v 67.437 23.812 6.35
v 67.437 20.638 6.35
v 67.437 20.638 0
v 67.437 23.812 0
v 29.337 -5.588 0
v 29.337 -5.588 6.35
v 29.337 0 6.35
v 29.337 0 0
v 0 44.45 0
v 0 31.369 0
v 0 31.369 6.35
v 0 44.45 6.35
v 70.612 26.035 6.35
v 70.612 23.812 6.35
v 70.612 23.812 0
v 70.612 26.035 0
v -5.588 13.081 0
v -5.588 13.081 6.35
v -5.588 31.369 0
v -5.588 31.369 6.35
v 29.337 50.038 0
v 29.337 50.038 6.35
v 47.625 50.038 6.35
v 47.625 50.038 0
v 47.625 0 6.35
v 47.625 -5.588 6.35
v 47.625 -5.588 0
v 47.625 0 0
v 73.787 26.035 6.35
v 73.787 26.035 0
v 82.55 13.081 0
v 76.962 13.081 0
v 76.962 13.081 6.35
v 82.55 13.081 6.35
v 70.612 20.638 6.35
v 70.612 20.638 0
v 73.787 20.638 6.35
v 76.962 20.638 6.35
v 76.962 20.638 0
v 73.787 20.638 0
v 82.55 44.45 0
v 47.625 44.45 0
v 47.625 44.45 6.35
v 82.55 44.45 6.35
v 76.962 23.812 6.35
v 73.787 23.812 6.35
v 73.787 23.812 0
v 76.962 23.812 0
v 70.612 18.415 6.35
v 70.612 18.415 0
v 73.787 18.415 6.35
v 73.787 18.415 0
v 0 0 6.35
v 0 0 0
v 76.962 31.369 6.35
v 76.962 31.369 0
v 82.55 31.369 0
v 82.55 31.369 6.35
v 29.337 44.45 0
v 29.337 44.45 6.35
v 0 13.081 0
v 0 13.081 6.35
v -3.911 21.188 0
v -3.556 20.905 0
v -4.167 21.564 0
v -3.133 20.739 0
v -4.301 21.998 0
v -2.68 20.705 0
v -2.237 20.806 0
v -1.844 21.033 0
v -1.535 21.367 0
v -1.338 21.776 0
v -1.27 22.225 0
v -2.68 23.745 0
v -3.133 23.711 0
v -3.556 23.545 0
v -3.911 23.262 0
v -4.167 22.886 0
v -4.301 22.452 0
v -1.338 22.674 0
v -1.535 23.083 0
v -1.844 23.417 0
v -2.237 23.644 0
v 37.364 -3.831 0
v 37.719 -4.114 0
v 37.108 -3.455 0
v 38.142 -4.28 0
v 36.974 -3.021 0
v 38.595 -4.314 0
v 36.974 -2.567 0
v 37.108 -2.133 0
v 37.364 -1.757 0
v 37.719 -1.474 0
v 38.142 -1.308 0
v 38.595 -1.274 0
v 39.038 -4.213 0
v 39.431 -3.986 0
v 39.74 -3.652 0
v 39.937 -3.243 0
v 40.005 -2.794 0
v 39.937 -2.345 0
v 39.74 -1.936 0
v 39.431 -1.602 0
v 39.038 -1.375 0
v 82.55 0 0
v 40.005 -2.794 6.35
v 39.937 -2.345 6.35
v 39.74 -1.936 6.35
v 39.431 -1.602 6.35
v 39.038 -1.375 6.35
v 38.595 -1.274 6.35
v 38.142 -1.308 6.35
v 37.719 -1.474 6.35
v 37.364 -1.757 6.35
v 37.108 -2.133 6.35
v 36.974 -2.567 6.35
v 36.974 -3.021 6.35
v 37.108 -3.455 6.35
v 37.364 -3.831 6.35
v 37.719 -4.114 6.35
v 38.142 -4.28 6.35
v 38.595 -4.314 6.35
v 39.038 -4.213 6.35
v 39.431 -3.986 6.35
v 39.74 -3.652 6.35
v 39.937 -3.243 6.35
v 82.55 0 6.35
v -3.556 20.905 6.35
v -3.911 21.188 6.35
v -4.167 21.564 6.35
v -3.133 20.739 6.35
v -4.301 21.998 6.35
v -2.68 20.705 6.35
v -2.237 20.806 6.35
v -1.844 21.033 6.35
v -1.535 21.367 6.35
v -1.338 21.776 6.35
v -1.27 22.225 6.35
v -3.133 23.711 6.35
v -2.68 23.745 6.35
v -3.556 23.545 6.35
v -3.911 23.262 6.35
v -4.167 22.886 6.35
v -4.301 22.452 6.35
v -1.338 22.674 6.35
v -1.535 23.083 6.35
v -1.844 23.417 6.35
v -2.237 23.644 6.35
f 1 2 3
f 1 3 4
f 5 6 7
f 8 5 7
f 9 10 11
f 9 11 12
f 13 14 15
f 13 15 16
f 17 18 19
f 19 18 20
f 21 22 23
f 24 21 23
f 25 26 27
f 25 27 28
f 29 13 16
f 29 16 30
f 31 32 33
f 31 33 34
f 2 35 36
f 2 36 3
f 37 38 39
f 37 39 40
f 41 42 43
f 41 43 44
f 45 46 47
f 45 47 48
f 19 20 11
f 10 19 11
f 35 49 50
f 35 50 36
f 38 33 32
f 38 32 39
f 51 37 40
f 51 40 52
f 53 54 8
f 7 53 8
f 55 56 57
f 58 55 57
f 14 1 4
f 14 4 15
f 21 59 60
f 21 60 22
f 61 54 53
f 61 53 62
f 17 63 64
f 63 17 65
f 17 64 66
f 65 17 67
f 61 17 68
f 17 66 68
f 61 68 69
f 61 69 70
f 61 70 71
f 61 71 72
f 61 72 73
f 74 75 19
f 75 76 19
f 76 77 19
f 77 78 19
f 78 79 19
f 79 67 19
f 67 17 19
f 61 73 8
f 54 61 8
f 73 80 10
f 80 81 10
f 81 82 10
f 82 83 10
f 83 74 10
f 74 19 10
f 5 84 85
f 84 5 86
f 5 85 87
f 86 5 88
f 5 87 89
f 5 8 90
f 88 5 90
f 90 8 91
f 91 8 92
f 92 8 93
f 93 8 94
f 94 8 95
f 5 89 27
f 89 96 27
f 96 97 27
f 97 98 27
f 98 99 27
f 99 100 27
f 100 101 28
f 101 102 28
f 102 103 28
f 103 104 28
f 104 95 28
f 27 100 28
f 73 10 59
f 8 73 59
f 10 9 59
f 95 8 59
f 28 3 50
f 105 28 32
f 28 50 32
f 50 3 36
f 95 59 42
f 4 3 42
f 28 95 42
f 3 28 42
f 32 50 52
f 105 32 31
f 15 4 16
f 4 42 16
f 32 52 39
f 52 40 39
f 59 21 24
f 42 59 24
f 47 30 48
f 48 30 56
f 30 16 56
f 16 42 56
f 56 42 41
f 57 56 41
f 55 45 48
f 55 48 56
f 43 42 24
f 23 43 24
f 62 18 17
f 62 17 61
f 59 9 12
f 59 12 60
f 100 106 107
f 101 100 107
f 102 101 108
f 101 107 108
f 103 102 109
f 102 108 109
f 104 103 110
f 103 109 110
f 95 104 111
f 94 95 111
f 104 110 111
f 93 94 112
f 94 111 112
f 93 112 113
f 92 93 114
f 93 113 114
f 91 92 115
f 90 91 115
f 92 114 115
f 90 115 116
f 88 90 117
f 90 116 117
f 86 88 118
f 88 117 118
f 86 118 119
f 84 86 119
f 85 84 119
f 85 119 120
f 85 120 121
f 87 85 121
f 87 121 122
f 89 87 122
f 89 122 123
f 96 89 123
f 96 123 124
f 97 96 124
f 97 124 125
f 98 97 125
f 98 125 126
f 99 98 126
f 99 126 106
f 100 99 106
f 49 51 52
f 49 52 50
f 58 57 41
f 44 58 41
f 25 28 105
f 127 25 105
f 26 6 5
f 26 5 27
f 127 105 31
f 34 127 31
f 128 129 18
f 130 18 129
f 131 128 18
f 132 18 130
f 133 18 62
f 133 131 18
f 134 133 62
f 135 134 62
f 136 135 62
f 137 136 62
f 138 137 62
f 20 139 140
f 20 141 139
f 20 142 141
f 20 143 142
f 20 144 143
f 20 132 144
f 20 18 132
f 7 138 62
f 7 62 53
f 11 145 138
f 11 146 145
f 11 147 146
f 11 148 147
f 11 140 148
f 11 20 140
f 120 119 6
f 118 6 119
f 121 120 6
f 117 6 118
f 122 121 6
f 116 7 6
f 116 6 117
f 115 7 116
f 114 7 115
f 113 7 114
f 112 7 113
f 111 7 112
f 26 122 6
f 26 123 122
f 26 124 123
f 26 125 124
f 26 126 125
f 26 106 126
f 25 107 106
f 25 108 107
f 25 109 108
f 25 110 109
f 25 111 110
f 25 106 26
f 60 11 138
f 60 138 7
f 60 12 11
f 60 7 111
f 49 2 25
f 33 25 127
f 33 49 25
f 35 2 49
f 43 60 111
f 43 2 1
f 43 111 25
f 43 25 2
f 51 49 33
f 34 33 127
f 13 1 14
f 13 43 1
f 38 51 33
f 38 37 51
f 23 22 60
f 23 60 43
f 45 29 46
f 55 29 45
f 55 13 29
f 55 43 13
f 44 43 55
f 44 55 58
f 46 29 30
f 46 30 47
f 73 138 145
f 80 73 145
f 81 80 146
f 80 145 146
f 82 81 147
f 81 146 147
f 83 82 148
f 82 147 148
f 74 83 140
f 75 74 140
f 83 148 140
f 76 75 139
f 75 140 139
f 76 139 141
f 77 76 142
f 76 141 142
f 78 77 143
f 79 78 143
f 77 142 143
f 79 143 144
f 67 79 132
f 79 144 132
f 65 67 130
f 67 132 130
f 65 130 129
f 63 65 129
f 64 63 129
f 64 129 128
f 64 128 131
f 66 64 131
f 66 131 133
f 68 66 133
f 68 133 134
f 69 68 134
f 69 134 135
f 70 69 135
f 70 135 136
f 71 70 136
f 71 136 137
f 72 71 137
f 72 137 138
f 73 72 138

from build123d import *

# Parameters (mm, degrees)
SKETCH1_W           = 82.55
SKETCH1_H           = 44.45
BOSS_EXTRUDE1_DEPTH = 6.35
SKETCH2_W           = 5.588
SKETCH2_H           = 18.288
BOSS_EXTRUDE2_DEPTH = 6.35
SKETCH5_W           = 18.288
SKETCH5_H           = 5.588
BOSS_EXTRUDE3_DEPTH = 6.35
SKETCH3_W           = 5.588
SKETCH3_H           = 18.288
CUT_EXTRUDE1_DEPTH  = 97.739994025
SKETCH6_R           = 1.524
CUT_EXTRUDE2_DEPTH  = 97.739994025


with BuildPart() as part:
    # Sketch1 → Boss-Extrude1 (new body)
    with BuildSketch(Plane.XY):
        with Locations((41.275, 22.225)):
            Rectangle(SKETCH1_W, SKETCH1_H)
    extrude(amount=BOSS_EXTRUDE1_DEPTH)

    # Sketch2 → Boss-Extrude2 (add)
    with BuildSketch(Plane.XY.offset(6.35)):
        with Locations((-2.794, 22.225)):
            Rectangle(SKETCH2_W, SKETCH2_H)
    extrude(amount=-BOSS_EXTRUDE2_DEPTH)

    # Sketch5 → Boss-Extrude3 (add)
    with BuildSketch(Plane.XY.offset(6.35)):
        with Locations((38.481, 47.244)):
            Rectangle(SKETCH5_W, SKETCH5_H)
        with Locations((38.481, -2.794)):
            Rectangle(SKETCH5_W, SKETCH5_H)
    extrude(amount=-BOSS_EXTRUDE3_DEPTH)

    # Sketch3 → Cut-Extrude1 (cut, through all)
    with BuildSketch(Plane.XY.offset(6.35)):
        with Locations((79.756, 22.225)):
            Rectangle(SKETCH3_W, SKETCH3_H)
    extrude(amount=-CUT_EXTRUDE1_DEPTH, mode=Mode.SUBTRACT)

    # Sketch6 → Cut-Extrude2 (cut, through all)
    with BuildSketch(Plane.XY.offset(6.35)):
        with Locations((-2.794, 22.225)):
            Circle(SKETCH6_R)
        with Locations((38.481, -2.794)):
            Circle(SKETCH6_R)
        Polygon((67.437, 23.8125), (70.612, 23.8125), (70.612, 26.035), (73.787, 26.035), (73.787, 23.8125), (76.962, 23.8125), (76.962, 20.6375), (73.787, 20.6375), (73.787, 18.415), (70.612, 18.415), (70.612, 20.6375), (67.437, 20.6375), align=None)
    extrude(amount=-CUT_EXTRUDE2_DEPTH, mode=Mode.SUBTRACT)


solid = part.part
